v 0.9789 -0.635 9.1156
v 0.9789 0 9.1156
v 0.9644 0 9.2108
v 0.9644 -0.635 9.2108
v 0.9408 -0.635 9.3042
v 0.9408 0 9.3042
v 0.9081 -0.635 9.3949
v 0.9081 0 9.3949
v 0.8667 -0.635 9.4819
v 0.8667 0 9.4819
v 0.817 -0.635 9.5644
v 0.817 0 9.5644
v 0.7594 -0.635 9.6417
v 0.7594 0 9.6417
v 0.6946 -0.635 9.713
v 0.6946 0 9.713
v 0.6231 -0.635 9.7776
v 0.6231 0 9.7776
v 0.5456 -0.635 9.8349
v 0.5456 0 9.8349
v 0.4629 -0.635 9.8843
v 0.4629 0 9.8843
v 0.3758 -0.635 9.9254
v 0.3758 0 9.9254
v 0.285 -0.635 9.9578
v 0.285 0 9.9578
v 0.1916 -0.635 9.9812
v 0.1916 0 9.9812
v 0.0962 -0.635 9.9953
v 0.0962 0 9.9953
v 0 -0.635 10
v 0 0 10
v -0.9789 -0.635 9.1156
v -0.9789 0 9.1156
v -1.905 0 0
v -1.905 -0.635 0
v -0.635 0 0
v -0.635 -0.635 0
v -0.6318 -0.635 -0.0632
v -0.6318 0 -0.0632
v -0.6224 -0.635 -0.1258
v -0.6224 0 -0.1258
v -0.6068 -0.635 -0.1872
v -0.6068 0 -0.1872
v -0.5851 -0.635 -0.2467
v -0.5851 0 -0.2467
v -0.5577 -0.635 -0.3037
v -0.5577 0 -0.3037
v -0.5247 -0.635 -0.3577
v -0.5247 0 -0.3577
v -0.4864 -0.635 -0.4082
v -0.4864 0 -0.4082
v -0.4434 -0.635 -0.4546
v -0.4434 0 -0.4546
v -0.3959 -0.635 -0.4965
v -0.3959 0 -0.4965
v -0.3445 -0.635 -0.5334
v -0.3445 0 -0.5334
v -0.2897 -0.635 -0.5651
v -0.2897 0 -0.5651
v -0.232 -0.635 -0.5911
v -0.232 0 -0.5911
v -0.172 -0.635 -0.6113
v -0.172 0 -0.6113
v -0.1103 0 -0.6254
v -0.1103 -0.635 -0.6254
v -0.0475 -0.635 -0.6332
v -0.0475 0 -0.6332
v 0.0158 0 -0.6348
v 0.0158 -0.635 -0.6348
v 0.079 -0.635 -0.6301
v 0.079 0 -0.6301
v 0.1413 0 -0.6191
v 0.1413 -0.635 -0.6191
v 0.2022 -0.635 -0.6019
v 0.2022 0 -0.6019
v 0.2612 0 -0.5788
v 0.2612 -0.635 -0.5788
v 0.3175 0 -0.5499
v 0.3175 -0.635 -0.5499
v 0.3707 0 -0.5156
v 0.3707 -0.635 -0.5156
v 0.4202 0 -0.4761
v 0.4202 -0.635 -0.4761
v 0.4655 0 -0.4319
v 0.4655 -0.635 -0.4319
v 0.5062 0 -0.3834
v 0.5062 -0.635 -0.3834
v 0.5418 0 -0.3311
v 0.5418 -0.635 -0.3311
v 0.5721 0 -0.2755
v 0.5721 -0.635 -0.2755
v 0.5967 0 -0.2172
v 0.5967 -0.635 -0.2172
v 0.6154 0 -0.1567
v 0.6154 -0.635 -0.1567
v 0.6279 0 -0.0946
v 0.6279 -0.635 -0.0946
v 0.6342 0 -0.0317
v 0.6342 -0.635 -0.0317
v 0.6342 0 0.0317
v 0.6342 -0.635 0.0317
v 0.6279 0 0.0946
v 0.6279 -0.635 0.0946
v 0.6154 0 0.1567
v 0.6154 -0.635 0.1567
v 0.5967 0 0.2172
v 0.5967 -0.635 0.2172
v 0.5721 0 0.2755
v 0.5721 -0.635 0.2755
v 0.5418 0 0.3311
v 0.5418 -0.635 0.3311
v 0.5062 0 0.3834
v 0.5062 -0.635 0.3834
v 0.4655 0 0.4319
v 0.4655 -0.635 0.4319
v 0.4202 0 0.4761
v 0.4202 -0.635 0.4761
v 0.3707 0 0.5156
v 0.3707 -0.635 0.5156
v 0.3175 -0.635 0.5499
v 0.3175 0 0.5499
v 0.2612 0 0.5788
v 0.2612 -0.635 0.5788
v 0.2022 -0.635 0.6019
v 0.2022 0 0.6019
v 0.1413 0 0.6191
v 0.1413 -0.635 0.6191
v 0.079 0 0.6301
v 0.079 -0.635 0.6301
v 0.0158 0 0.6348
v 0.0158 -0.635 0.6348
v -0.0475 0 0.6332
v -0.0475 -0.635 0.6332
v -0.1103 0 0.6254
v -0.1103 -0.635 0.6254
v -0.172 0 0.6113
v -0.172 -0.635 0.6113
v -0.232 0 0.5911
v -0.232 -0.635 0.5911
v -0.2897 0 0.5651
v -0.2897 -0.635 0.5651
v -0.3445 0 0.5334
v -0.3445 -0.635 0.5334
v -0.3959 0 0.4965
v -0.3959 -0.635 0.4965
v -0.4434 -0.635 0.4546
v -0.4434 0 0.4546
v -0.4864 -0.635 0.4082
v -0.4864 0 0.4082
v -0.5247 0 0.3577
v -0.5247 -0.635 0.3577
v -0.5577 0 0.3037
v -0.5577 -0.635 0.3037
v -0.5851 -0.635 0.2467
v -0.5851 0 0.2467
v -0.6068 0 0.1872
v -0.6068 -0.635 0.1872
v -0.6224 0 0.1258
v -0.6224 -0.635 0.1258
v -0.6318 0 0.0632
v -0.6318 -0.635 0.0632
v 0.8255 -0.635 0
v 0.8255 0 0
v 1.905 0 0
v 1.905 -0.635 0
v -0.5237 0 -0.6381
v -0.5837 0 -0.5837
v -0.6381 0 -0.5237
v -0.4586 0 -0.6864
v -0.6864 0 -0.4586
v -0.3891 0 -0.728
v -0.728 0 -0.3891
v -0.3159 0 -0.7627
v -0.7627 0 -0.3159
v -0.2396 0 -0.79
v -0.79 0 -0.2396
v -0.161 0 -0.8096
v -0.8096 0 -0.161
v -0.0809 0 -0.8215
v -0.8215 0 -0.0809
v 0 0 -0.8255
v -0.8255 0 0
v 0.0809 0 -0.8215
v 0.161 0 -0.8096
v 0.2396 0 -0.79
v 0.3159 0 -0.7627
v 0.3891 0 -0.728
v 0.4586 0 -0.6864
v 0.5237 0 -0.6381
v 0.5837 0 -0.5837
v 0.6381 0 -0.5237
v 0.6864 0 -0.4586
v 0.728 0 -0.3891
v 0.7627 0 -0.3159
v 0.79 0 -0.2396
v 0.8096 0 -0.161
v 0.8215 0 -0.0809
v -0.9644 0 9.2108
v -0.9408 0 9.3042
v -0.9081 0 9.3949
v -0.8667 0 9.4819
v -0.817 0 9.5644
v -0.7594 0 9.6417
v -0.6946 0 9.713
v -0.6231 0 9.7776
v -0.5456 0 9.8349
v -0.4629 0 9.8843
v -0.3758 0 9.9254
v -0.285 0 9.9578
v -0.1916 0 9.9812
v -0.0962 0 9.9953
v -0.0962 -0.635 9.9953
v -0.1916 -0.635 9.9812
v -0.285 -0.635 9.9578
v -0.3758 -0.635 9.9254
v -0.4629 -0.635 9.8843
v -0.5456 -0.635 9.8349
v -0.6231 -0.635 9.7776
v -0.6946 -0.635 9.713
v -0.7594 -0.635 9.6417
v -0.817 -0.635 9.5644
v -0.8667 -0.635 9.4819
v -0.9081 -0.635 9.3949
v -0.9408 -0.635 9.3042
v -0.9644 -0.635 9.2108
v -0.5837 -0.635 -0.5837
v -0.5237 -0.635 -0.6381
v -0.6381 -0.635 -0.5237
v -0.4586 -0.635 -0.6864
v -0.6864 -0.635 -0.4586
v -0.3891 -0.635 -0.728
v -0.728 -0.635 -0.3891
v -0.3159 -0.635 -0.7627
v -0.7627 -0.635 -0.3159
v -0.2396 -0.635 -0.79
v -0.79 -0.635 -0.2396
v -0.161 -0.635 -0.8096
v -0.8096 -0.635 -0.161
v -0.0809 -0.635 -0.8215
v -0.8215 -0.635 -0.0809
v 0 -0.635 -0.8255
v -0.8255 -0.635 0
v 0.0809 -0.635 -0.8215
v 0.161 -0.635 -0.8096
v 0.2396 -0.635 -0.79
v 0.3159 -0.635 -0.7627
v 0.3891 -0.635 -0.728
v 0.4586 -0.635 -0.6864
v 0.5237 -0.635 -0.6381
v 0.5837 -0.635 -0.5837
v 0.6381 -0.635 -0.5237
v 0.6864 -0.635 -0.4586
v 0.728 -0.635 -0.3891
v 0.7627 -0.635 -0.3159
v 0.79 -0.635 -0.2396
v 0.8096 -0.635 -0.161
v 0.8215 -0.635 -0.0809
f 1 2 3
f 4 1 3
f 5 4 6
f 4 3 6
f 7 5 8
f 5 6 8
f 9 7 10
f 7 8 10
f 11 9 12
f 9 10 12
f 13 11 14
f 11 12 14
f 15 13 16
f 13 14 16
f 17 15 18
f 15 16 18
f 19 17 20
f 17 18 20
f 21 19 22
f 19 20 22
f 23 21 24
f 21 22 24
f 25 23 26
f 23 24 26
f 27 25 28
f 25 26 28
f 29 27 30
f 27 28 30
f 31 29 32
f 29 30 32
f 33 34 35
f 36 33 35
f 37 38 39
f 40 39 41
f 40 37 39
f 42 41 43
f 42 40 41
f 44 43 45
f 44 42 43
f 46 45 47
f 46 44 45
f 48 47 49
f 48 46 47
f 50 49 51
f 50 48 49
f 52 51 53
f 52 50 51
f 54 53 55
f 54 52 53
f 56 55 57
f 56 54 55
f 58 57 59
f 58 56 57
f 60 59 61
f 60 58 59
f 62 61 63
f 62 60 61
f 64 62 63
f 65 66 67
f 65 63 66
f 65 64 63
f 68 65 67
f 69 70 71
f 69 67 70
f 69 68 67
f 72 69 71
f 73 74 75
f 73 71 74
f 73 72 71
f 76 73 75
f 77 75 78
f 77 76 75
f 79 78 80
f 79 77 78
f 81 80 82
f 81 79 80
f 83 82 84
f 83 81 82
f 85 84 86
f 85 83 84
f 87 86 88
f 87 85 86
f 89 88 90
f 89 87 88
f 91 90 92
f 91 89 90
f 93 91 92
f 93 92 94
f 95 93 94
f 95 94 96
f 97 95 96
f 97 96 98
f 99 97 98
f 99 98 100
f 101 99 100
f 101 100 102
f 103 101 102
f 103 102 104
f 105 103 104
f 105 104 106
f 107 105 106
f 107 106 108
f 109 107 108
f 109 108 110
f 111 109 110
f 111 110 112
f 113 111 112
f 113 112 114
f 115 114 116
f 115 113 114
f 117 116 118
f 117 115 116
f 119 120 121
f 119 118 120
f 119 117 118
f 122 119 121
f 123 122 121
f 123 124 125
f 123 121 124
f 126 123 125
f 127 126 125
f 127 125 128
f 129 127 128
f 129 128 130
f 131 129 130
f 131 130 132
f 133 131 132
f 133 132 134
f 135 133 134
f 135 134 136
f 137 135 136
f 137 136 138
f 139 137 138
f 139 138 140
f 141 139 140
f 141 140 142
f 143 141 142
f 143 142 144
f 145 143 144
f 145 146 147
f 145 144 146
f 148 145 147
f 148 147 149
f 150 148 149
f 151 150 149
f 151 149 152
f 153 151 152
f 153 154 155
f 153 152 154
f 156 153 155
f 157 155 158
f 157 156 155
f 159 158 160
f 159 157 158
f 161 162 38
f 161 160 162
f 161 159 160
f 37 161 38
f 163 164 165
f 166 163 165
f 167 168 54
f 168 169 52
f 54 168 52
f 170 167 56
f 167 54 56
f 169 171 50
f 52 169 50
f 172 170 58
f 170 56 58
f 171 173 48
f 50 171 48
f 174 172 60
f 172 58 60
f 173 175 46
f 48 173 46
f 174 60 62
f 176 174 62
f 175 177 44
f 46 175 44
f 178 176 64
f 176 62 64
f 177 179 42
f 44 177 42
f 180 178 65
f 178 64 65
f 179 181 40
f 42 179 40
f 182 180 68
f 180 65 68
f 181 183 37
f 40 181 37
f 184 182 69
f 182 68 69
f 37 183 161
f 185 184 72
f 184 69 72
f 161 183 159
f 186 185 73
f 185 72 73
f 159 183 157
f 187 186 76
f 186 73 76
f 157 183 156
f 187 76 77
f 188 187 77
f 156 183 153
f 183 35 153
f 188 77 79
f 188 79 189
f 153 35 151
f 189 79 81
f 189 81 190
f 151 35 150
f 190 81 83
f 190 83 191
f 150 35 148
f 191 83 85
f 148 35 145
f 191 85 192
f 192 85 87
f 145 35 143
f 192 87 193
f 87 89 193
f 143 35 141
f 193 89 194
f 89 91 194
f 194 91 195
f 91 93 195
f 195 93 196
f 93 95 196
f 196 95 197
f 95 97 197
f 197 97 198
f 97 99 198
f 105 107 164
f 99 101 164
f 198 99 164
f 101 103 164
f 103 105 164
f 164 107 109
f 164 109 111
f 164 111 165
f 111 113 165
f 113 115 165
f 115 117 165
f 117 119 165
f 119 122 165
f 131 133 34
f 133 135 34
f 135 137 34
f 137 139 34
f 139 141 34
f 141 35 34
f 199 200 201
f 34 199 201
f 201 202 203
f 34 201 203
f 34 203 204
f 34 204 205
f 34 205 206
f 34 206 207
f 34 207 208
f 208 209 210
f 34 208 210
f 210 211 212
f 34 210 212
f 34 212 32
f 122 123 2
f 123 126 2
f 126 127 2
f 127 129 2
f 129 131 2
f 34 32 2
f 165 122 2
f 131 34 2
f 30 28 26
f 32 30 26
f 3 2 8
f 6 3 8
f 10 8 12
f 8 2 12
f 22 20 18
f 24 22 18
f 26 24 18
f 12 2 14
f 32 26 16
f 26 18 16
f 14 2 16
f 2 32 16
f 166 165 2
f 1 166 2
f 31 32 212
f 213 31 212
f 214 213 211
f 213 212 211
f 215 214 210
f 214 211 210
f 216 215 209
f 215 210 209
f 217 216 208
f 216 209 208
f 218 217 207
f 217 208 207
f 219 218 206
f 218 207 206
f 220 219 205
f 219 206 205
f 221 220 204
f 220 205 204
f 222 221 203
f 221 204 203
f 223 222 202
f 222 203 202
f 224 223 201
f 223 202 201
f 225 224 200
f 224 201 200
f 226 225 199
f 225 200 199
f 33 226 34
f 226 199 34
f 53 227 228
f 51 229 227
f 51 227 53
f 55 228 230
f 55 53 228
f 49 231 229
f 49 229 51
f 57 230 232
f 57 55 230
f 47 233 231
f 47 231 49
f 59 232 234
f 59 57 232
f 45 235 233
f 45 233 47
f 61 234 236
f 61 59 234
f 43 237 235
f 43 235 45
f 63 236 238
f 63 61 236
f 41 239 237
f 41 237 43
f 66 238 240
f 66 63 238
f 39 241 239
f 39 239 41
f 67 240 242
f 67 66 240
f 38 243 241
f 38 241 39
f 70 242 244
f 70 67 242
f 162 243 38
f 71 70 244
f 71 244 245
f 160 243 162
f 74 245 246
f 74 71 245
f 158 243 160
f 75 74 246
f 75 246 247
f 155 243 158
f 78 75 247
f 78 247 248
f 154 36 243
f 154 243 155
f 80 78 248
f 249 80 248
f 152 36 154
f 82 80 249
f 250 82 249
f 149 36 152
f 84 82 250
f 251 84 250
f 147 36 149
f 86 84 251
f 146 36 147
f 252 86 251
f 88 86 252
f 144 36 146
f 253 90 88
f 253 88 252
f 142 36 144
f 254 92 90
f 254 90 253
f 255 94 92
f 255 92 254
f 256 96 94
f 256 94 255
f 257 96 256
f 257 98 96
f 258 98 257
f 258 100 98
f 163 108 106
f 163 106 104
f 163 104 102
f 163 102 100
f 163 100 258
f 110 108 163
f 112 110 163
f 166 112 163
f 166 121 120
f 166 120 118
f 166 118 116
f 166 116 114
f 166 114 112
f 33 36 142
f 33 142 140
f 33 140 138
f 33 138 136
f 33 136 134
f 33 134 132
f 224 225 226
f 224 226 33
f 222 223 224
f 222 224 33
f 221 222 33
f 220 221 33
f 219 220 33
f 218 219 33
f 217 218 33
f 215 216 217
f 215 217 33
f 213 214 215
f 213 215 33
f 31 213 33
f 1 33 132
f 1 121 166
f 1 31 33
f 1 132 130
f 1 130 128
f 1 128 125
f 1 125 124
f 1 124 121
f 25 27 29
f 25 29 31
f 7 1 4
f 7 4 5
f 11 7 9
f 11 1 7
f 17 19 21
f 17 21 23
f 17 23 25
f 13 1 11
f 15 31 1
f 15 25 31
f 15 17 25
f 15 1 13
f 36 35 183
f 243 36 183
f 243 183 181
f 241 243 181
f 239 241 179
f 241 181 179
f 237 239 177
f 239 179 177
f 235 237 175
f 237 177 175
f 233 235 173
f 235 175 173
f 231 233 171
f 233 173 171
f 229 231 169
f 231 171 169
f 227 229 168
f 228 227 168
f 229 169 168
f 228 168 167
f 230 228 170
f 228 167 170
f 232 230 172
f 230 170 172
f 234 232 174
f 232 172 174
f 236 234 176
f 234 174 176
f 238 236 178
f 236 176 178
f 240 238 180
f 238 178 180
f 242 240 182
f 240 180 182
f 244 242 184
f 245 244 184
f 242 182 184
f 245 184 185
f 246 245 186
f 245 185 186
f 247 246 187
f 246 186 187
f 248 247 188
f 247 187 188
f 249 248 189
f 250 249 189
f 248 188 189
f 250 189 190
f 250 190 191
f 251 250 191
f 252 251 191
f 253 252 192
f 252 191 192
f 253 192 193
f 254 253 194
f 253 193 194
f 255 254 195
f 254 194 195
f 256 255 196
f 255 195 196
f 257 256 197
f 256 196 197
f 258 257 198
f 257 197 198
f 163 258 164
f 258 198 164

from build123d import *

# Parameters (mm, degrees)
F1_DEPTH = 0.635
F3_DEPTH = 25.4


with BuildPart() as f1:
    # F0 (on Front) → F1 (new body)
    with BuildSketch(Plane.XZ):
        with BuildLine():
            ThreePointArc((-0.8255, 0), (0, 0.8255), (0.8255, 0))
            Line((0.8255, 0), (1.905, 0))
            Line((1.905, 0), (0.9788597992, 9.1155531579))
            ThreePointArc((0.9788597992, 9.1155531579), (0.6596235144, 9.7461380267), (0, 10))
            ThreePointArc((0, 10), (-0.6596235144, 9.7461380267), (-0.9788597992, 9.1155531579))
            Line((-0.9788597992, 9.1155531579), (-1.905, 0))
            Line((-1.905, 0), (-0.8255, 0))
        make_face()
        with BuildLine():
            ThreePointArc((-0.8255, 0), (0, -0.8255), (0.8255, 0))
            Line((0.8255, 0), (-0.8255, 0))
        make_face()
        with BuildLine():
            Line((-0.8255, 0), (0.8255, 0))
            ThreePointArc((0.8255, 0), (0, 0.8255), (-0.8255, 0))
        make_face()
    extrude(amount=F1_DEPTH)

    # F2 (on face) → F3 (cut)
    with BuildSketch(Plane.XZ):
        with BuildLine():
            Line((-0.635, 0), (0.635, 0))
            ThreePointArc((0.635, 0), (0, 0.635), (-0.635, 0))
        make_face()
        with BuildLine():
            ThreePointArc((-0.635, 0), (0, -0.635), (0.635, 0))
            Line((0.635, 0), (-0.635, 0))
        make_face()
    extrude(amount=F3_DEPTH, mode=Mode.SUBTRACT)


solid = f1.part
